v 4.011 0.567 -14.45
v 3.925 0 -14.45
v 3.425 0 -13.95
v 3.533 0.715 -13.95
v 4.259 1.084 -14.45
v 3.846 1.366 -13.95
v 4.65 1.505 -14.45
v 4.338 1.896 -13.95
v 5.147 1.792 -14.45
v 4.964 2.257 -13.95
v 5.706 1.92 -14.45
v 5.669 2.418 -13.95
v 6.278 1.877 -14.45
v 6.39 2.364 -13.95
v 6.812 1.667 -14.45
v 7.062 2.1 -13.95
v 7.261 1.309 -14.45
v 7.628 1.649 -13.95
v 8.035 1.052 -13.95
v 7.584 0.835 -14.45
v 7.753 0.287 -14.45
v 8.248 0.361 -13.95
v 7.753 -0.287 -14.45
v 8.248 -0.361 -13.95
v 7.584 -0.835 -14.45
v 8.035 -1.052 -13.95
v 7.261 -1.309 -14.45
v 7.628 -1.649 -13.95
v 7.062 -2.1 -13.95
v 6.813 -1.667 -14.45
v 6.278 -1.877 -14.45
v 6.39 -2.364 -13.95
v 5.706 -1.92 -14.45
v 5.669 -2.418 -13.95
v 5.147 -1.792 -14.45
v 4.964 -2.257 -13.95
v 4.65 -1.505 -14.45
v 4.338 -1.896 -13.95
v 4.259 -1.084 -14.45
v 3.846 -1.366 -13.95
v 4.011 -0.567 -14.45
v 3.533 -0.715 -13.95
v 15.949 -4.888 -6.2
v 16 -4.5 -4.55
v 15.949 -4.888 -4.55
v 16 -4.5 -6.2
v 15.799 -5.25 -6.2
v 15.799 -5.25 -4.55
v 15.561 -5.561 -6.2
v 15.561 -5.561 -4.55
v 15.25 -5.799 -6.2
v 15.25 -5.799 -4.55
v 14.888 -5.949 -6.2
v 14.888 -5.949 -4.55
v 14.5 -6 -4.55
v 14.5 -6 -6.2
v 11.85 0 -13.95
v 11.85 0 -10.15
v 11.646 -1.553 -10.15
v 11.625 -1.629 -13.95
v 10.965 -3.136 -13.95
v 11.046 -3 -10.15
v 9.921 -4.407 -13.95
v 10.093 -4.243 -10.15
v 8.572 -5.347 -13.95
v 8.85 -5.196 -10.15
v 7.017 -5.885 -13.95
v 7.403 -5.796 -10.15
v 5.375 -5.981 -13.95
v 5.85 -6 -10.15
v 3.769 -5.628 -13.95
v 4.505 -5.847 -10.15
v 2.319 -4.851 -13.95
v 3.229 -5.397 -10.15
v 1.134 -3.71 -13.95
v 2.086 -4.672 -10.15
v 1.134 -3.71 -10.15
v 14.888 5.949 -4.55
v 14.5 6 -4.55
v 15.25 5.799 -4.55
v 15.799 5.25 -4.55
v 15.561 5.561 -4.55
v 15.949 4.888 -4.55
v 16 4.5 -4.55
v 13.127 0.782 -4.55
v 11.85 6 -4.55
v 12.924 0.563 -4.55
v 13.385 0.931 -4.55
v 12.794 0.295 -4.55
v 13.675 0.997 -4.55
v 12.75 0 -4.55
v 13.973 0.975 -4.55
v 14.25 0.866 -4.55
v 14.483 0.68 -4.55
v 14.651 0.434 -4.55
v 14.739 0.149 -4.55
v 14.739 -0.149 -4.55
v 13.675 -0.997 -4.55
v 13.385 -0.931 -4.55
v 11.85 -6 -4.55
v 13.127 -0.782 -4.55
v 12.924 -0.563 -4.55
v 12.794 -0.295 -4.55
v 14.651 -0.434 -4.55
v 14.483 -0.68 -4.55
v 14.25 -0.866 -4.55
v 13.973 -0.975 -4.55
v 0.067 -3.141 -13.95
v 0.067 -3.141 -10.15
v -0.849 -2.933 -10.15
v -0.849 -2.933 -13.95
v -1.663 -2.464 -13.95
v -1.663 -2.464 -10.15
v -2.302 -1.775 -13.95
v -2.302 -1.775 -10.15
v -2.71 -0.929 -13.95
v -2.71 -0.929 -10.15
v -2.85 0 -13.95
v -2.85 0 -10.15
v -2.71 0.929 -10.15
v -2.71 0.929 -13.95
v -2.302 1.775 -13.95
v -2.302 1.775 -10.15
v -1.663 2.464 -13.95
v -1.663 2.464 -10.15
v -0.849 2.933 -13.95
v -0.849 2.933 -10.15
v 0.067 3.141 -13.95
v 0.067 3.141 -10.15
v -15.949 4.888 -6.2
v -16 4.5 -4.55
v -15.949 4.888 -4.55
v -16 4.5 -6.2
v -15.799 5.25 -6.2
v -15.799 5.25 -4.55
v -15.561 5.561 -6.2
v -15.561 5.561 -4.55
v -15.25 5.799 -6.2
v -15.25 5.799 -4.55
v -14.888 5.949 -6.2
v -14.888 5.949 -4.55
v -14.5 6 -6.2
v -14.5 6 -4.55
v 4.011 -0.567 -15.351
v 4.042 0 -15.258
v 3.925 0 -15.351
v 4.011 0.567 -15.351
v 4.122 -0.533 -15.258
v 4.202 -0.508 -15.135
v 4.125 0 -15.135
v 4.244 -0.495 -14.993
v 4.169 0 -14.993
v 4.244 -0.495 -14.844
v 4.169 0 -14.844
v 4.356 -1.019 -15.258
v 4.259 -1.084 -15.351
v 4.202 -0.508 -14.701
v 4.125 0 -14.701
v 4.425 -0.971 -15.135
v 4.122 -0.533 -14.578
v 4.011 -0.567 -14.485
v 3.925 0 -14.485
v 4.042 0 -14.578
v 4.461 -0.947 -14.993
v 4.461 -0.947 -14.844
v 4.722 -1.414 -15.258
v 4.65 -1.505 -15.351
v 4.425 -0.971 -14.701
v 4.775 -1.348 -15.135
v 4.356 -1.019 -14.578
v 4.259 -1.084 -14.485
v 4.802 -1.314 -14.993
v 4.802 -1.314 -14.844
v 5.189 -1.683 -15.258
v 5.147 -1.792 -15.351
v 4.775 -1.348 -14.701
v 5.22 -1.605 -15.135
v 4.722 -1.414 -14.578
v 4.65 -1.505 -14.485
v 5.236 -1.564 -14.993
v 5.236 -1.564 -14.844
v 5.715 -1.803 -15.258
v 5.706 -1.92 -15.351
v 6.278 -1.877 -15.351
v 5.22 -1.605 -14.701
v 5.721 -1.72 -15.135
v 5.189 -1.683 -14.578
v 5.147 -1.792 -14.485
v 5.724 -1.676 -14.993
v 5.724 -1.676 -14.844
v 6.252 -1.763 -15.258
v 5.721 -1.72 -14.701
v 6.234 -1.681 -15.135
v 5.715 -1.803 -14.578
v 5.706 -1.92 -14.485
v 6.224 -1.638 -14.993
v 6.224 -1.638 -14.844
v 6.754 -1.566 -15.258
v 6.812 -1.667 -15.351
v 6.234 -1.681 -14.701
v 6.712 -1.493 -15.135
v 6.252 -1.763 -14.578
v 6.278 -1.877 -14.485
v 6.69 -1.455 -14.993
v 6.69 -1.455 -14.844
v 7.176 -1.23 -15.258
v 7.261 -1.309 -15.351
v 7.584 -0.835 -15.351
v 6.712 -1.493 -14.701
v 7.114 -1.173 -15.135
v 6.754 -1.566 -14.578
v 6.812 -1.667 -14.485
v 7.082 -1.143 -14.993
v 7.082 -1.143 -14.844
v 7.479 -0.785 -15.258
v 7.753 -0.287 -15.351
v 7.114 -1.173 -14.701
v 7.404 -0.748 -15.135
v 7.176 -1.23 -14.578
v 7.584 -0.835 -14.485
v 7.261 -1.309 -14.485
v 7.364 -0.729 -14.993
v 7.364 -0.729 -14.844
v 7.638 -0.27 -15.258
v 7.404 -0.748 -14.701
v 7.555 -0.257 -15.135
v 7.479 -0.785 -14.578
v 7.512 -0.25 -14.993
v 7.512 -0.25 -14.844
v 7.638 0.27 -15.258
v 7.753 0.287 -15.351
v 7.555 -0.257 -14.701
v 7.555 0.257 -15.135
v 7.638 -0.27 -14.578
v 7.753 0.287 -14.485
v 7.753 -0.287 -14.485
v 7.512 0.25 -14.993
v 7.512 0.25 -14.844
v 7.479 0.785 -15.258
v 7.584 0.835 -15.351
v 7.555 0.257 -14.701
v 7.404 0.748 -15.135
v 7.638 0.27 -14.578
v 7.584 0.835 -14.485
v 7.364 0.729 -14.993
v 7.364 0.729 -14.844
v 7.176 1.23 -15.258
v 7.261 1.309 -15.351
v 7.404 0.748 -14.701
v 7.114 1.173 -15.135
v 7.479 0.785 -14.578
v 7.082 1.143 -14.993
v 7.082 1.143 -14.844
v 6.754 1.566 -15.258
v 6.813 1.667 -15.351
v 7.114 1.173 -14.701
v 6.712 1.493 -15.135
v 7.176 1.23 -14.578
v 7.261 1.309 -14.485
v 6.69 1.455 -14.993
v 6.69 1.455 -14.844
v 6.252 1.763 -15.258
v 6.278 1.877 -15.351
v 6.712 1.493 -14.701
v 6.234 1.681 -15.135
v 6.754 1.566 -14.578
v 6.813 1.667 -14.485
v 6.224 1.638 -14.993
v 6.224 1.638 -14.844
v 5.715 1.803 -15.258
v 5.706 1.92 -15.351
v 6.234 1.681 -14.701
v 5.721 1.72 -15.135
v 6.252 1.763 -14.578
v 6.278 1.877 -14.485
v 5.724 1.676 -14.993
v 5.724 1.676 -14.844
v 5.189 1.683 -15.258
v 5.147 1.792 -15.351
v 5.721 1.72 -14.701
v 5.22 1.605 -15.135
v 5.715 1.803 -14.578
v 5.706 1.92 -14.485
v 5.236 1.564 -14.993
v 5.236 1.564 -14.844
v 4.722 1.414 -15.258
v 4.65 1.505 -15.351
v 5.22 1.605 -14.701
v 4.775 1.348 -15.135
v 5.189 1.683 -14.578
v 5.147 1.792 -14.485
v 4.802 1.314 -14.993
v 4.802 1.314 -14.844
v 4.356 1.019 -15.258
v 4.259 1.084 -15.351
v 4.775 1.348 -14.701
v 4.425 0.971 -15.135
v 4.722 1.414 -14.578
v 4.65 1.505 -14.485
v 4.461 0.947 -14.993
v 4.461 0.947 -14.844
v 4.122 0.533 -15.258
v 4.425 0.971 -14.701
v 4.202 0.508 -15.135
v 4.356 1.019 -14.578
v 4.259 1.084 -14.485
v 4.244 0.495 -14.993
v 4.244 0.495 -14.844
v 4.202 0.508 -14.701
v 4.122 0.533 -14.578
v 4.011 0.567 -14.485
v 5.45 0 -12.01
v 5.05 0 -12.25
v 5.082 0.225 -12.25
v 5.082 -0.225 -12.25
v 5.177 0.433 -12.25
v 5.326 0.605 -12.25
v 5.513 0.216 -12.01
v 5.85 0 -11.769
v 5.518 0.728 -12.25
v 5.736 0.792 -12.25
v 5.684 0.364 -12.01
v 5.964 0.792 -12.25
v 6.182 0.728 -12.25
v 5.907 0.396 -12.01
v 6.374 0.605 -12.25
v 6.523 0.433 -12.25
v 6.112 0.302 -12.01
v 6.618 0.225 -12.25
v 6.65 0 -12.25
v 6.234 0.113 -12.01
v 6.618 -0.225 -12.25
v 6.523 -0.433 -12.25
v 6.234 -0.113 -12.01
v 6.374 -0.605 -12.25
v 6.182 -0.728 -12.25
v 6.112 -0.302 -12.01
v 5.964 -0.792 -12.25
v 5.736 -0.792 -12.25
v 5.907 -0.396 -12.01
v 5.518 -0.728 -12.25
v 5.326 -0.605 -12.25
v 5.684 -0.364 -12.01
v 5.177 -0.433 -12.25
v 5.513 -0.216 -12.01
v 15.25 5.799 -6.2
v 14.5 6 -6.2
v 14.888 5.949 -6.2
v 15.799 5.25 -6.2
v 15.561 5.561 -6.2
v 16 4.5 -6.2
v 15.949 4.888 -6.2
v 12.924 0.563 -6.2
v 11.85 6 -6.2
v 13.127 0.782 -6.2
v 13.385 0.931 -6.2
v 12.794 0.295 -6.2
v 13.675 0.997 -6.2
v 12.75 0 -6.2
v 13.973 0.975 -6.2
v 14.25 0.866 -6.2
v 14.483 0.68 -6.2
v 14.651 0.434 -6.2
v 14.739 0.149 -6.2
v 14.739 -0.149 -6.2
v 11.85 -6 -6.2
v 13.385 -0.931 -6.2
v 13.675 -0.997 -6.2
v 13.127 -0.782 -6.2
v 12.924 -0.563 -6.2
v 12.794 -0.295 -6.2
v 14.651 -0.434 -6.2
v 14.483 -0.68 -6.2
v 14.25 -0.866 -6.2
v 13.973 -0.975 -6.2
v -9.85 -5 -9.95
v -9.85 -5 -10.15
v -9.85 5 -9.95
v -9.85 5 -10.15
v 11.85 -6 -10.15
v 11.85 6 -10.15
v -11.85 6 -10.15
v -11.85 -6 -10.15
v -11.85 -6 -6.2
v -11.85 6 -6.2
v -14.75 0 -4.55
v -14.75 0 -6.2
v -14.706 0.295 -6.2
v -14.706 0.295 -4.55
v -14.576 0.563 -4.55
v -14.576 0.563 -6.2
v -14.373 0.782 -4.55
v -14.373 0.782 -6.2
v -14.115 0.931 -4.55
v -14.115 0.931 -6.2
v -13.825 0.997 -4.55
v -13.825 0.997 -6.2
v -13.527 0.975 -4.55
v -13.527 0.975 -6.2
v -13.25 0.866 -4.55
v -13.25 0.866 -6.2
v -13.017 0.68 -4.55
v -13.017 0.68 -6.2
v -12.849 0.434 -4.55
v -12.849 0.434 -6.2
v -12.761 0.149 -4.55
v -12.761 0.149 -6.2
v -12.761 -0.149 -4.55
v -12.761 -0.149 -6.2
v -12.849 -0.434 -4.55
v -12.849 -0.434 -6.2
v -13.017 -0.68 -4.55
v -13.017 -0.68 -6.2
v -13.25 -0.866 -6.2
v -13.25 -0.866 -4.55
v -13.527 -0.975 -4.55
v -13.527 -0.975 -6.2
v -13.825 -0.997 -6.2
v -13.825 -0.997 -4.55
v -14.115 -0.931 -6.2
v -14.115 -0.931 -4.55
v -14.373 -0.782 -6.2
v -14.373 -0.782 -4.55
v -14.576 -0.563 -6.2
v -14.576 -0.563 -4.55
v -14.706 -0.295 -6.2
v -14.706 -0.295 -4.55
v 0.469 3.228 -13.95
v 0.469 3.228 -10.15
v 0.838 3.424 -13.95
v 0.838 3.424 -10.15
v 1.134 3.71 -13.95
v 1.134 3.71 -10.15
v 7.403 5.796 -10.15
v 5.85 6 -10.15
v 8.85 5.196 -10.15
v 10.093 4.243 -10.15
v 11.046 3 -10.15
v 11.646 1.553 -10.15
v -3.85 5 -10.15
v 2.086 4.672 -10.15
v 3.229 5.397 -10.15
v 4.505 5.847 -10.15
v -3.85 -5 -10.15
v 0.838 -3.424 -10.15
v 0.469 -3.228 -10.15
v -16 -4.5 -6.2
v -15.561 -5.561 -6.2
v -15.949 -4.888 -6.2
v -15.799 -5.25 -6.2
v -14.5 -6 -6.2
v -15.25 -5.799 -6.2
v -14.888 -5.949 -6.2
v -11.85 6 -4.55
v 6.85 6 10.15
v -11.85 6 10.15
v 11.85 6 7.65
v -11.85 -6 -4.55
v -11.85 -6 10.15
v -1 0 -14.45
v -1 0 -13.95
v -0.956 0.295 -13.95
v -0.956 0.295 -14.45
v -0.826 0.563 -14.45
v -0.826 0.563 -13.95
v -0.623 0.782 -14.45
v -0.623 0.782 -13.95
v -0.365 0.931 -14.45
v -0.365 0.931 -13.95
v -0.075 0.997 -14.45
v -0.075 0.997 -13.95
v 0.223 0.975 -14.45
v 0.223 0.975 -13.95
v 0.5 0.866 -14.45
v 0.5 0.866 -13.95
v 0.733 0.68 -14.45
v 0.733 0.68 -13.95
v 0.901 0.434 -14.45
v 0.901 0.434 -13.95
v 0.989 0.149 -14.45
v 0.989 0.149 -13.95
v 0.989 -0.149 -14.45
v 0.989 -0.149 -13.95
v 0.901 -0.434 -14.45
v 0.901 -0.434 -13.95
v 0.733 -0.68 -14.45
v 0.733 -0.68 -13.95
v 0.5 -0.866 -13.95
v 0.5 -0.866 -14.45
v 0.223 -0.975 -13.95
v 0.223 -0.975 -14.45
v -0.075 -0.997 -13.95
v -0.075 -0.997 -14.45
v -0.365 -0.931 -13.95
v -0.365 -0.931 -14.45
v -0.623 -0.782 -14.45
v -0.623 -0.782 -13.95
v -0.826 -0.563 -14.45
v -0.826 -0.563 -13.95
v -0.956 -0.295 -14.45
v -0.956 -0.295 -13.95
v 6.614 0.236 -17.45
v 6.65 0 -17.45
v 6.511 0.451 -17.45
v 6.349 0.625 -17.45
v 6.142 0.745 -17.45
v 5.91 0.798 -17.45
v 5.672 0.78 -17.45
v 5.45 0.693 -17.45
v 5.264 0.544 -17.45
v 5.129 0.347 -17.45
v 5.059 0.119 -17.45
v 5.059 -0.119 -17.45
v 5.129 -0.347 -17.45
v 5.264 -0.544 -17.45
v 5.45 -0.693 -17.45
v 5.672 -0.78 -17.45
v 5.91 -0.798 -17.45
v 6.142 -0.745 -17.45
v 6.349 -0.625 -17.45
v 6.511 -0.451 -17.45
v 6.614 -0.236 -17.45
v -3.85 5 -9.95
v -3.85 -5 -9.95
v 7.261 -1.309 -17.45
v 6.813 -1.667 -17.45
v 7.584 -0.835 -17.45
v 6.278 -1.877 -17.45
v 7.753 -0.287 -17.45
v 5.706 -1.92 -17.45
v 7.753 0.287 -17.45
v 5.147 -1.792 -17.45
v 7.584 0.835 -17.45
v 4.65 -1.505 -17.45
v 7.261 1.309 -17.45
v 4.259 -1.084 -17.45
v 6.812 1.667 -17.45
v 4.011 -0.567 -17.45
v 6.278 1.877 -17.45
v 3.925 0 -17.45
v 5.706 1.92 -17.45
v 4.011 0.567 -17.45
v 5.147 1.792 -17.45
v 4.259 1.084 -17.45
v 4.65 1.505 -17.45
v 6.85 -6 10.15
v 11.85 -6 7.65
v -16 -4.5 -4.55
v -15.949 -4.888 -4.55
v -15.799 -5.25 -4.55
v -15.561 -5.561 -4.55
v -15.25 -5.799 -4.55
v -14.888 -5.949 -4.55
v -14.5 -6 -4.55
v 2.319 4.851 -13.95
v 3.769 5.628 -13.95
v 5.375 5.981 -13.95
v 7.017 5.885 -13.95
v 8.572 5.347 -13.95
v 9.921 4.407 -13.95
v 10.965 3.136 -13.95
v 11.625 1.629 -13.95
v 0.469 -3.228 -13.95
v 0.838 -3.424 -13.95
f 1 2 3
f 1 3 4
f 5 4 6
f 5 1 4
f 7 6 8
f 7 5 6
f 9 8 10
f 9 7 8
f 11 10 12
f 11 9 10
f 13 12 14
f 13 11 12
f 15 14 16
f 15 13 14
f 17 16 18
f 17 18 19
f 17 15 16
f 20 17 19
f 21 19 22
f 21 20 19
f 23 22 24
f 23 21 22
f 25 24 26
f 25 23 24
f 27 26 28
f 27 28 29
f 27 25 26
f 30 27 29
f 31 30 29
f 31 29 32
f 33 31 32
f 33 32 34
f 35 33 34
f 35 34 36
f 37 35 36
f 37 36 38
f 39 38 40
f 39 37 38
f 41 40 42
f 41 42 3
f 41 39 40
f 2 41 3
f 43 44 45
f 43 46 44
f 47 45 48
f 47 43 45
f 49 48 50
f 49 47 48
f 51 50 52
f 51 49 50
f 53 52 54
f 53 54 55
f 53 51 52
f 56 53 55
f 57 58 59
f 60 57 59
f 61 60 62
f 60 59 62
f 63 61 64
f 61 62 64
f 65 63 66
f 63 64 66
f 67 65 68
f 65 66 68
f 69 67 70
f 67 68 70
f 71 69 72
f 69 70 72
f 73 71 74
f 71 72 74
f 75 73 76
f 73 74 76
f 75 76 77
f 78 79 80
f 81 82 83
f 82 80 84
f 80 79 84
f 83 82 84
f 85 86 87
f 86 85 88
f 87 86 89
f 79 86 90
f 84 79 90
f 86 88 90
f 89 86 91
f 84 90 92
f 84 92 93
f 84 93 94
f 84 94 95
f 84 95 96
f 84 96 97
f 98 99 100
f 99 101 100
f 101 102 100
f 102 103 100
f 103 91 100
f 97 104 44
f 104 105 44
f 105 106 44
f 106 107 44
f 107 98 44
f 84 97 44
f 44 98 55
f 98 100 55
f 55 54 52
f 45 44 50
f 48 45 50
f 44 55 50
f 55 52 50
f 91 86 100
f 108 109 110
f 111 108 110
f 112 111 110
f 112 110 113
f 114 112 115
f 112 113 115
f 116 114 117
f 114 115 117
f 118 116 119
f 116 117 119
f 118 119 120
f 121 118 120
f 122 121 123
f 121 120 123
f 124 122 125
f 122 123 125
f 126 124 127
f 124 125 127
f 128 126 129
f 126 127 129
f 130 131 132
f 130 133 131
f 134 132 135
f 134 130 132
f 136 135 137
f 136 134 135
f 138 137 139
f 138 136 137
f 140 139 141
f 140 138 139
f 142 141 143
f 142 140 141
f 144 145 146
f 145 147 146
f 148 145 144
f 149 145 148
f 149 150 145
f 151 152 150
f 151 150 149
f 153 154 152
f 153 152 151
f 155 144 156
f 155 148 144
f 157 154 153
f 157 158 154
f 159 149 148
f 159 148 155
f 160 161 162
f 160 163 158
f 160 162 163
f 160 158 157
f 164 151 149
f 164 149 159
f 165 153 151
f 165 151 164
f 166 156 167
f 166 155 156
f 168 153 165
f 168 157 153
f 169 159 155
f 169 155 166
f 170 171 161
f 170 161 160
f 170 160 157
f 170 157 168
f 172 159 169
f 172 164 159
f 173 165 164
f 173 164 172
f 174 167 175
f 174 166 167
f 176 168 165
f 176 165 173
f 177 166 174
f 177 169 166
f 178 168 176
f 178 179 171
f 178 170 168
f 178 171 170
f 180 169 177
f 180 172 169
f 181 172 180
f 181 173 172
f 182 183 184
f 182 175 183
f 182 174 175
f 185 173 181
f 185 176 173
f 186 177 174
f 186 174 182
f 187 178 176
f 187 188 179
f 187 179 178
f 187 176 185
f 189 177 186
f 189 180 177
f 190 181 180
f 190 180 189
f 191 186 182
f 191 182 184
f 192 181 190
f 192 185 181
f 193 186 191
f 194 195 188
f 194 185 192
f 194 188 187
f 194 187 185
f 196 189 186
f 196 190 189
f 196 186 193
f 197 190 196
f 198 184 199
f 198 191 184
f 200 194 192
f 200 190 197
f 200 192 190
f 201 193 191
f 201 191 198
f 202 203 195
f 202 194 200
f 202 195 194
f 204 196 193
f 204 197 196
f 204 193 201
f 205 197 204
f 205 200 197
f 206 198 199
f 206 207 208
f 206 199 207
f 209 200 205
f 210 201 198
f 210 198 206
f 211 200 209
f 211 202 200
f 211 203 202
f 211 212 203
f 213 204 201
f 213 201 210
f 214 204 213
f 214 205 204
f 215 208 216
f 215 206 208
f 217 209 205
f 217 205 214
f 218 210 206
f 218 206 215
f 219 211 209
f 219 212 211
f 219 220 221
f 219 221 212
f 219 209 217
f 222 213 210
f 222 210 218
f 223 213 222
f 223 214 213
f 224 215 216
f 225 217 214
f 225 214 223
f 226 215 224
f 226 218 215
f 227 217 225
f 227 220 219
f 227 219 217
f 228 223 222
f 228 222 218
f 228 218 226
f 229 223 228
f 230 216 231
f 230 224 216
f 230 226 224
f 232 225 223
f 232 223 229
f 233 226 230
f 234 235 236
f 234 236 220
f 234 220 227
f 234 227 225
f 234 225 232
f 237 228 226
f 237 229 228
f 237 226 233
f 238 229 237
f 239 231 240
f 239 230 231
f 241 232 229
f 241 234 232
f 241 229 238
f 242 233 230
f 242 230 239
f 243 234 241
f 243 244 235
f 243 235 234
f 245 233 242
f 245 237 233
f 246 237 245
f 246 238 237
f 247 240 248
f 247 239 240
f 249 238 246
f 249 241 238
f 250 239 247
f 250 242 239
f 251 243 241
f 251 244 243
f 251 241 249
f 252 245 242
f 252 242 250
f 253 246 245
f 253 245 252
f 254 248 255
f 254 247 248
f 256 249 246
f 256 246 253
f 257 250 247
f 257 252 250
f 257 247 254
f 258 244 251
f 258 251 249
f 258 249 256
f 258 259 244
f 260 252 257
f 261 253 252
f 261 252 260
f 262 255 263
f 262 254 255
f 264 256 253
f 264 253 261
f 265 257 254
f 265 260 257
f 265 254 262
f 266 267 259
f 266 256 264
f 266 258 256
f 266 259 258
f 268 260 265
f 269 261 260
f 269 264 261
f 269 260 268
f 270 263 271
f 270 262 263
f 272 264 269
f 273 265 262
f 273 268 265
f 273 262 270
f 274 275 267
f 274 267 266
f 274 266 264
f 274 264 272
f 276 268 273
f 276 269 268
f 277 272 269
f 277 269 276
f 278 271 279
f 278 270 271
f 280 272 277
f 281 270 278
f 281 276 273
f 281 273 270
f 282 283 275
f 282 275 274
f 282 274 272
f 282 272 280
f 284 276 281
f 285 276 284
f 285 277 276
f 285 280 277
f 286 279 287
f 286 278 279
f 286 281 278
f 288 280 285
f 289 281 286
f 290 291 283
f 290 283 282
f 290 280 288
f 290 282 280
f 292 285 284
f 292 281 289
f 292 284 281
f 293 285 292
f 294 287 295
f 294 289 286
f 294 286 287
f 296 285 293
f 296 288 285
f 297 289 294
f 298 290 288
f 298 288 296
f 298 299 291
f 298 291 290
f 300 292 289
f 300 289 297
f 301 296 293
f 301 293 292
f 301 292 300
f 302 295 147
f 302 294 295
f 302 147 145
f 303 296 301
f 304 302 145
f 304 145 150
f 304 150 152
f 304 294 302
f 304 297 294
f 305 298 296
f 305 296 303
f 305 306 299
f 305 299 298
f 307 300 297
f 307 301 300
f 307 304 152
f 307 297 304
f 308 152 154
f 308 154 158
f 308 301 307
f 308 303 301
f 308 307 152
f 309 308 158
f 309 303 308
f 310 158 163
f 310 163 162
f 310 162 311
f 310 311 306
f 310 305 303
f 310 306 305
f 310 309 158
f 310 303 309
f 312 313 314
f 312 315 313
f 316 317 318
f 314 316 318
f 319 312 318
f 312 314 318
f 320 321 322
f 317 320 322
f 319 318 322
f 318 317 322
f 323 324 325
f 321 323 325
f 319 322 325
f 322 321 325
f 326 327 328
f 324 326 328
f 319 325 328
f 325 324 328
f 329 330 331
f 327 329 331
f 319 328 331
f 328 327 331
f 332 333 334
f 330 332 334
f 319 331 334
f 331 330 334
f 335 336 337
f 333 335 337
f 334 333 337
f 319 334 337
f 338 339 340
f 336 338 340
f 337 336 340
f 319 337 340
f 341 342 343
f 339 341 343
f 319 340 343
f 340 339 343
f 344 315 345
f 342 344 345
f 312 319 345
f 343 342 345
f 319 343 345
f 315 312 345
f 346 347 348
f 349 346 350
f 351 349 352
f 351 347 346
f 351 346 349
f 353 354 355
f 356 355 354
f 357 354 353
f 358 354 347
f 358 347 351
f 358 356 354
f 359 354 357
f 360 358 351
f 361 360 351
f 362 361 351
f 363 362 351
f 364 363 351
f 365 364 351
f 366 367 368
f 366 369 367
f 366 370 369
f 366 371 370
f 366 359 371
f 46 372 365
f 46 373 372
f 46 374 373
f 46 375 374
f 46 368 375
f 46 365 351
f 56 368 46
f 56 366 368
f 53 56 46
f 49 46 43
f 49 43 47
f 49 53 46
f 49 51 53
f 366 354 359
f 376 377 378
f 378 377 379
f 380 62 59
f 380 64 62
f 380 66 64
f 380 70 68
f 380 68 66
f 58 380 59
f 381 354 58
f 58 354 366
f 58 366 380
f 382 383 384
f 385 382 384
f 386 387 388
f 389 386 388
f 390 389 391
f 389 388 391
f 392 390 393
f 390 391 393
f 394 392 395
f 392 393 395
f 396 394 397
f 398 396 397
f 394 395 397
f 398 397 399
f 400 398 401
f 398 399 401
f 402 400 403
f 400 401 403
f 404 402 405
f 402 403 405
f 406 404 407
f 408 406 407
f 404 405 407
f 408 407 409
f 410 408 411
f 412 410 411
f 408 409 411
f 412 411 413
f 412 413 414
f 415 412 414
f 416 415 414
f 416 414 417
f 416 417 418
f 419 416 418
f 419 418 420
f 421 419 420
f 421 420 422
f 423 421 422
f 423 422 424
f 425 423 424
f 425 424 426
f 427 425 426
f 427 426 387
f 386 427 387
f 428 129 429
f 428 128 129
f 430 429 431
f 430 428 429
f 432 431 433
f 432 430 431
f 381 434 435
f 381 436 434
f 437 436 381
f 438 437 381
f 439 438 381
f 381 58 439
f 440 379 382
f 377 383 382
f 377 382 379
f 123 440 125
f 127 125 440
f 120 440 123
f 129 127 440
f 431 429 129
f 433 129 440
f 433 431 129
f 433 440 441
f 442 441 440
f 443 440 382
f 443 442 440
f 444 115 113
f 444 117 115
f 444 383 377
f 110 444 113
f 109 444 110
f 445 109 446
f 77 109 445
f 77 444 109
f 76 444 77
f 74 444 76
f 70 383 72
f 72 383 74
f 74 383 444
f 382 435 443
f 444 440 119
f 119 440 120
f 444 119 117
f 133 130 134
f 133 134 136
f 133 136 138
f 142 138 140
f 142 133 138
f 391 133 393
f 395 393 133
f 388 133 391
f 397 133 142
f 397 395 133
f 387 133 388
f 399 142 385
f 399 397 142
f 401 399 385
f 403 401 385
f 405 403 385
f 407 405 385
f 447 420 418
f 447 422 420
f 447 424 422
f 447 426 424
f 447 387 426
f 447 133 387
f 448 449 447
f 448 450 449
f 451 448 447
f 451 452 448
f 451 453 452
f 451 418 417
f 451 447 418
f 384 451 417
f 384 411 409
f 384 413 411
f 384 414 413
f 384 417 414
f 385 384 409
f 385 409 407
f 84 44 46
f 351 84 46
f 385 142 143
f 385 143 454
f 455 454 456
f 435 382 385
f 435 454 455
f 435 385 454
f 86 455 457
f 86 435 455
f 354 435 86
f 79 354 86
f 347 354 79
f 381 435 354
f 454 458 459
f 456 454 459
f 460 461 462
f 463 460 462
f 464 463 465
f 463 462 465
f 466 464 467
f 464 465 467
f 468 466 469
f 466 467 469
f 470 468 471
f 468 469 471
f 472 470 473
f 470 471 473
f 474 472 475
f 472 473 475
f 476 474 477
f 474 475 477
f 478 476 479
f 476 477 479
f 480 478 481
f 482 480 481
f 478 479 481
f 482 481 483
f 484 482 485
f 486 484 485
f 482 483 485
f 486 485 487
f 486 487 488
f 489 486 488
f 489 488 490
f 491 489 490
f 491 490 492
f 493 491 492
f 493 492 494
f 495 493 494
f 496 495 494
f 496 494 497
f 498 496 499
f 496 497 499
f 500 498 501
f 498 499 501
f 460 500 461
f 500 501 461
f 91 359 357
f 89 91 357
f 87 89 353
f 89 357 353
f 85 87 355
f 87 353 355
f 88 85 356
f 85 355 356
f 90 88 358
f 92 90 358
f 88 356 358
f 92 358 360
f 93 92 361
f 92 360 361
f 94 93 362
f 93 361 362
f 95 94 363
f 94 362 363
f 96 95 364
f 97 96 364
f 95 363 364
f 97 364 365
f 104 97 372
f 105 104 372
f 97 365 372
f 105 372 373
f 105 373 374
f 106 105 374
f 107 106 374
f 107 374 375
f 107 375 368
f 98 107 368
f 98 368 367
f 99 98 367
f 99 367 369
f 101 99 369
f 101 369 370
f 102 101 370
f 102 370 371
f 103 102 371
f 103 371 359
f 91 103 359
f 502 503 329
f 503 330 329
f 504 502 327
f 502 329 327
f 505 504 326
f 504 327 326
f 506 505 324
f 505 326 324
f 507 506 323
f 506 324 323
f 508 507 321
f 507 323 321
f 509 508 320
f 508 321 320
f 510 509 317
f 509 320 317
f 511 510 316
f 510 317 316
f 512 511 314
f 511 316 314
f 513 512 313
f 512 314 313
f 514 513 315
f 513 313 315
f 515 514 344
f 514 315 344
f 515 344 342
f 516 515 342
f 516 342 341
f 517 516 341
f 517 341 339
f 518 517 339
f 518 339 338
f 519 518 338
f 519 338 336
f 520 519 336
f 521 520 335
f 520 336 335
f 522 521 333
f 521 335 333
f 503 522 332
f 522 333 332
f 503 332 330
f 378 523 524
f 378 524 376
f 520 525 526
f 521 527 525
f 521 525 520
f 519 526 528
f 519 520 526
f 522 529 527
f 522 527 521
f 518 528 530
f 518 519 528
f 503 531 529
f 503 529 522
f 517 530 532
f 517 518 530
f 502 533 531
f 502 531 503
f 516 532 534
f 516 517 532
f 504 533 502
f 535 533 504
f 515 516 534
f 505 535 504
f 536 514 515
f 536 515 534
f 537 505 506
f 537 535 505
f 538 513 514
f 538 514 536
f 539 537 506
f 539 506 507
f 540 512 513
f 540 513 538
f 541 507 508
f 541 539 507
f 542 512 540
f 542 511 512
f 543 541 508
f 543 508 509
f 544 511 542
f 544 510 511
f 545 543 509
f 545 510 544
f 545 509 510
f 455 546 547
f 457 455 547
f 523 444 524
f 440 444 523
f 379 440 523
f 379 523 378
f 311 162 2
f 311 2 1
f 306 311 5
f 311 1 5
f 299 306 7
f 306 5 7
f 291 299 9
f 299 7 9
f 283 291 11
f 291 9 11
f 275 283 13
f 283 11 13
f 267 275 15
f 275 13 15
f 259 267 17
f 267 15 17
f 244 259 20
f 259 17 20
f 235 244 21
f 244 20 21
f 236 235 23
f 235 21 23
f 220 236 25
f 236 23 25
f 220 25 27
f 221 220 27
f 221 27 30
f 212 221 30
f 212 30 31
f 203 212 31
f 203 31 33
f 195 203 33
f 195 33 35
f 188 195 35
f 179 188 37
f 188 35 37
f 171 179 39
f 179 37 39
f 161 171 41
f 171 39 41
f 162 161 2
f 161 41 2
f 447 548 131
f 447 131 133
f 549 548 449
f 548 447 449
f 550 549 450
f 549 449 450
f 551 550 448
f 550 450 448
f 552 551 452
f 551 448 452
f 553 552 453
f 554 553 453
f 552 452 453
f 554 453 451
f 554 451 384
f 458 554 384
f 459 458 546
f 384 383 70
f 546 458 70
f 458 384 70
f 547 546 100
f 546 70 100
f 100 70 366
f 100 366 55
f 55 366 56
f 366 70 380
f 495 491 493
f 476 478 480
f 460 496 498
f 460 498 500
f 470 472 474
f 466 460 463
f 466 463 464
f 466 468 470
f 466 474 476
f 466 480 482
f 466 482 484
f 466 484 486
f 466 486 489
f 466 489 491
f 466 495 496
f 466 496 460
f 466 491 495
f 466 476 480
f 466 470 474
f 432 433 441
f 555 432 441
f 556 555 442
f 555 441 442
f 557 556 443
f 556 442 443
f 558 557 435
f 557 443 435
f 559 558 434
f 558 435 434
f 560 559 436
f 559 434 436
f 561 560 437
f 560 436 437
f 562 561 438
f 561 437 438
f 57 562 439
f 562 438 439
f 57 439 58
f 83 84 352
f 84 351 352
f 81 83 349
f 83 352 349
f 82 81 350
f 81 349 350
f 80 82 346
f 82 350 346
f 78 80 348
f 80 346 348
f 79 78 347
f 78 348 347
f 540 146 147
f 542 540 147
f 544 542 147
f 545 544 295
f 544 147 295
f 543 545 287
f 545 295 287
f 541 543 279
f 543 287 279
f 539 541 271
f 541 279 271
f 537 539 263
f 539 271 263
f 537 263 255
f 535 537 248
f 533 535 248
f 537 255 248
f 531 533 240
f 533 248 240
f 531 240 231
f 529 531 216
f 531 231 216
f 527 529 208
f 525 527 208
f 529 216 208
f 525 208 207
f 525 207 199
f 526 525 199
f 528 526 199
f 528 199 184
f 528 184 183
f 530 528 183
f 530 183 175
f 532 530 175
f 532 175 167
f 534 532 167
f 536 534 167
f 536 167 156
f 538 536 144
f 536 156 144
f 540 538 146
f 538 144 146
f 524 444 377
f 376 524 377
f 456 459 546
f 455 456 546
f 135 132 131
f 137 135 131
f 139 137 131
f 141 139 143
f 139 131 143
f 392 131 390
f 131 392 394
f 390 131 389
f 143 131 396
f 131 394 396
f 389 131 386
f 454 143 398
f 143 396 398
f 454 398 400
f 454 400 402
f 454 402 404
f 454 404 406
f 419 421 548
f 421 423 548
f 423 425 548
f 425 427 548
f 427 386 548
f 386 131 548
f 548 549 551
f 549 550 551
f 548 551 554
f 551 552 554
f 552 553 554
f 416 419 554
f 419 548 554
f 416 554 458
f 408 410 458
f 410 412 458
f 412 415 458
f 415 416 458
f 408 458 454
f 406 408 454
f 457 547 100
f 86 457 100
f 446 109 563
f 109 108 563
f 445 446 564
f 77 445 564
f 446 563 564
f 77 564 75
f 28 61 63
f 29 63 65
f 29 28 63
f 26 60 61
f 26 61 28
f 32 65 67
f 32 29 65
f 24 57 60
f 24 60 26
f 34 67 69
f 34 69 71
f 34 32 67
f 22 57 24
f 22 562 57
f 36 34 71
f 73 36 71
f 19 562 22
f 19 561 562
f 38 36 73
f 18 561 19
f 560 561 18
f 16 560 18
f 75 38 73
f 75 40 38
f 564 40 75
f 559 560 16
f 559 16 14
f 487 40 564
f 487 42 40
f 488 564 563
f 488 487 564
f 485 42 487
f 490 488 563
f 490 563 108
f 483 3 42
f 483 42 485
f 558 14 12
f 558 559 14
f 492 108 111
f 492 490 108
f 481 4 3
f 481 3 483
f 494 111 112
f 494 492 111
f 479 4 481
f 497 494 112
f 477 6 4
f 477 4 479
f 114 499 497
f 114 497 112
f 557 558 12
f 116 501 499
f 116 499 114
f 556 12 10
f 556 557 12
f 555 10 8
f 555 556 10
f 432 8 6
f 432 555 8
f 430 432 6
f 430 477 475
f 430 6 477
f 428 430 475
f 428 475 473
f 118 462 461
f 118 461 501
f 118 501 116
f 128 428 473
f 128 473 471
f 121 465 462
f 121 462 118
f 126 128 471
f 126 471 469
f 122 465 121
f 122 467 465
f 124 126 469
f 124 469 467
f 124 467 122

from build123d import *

# Parameters (mm, degrees)
BOSS_EXTRUDE1_DEPTH       = 6
BOSS_EXTRUDE1_DEPTH_BACK  = 6
SKETCH1_W                 = 23.7
SKETCH1_H                 = 3.95
SKETCH1_H_2               = 1.65
SKETCH1_W_2               = 4.15
FILLET1_R                 = 1.5
SKETCH2_R                 = 1
CUT_EXTRUDE1_DEPTH        = 24.65
BOSS_EXTRUDE2_DEPTH       = 3.8
FILLET2_R                 = 1.5
SKETCH4_W                 = 6
SKETCH4_H                 = 10
CUT_EXTRUDE2_DEPTH        = 0.2
SKETCH5_R                 = 1
BOSS_EXTRUDE3_DEPTH       = 0.5
SKETCH6_R                 = 1.925
BOSS_EXTRUDE4_DEPTH       = 0.5
CHAMFER1_SIZE             = 0.5
SKETCH7_R                 = 1.925
BOSS_EXTRUDE5_DEPTH       = 3
SKETCH8_R                 = 0.5
M2X0_4_TAPPED_HOLE1_D     = 1.6
M2X0_4_TAPPED_HOLE1_DEPTH = 5.2
M2X0_4_TAPPED_HOLE1_TIP   = 0.480688495


with BuildPart() as part:
    # Sketch1 → Boss-Extrude1 (new, two sides: drawn at the far end of the back side and taken through both)
    with BuildSketch(Plane(origin=(0, 0, 0), x_dir=(1, 0, 0), z_dir=(0, 1, 0)).offset(-BOSS_EXTRUDE1_DEPTH_BACK)):
        with Locations((0, 8.175)):
            Rectangle(SKETCH1_W, SKETCH1_H)
        with Locations((0, 5.375)):
            Rectangle(SKETCH1_W, SKETCH1_H_2)
        with Locations((-13.925, 5.375)):
            Rectangle(SKETCH1_W_2, SKETCH1_H_2)
        with Locations((13.925, 5.375)):
            Rectangle(SKETCH1_W_2, SKETCH1_H_2)
        Polygon((-11.85, -10.15), (6.85, -10.15), (11.85, -7.65), (11.85, 4.55), (-11.85, 4.55), align=None)
    extrude(amount=BOSS_EXTRUDE1_DEPTH + BOSS_EXTRUDE1_DEPTH_BACK)

    # Fillet1
    fillet1_edges = [part.edges().sort_by_distance(p)[0] for p in [
        (-16, -6, -5.375),
        (16, 6, -5.375),
        (-16, 6, -5.375),
        (16, -6, -5.375),
    ]]
    fillet(fillet1_edges, radius=FILLET1_R)

    # Sketch2 → Cut-Extrude1 (cut, through all)
    with BuildSketch(Plane(origin=(0, 0, -6.2), x_dir=(-1, 0, 0), z_dir=(0, 0, -1))):
        with Locations((-13.75, 0)):
            Circle(SKETCH2_R)
        with Locations((13.75, 0)):
            Circle(SKETCH2_R)
    extrude(amount=-CUT_EXTRUDE1_DEPTH, mode=Mode.SUBTRACT)

    # Sketch3 → Boss-Extrude2 (add)
    with BuildSketch(Plane(origin=(0, 0, -10.15), x_dir=(-1, 0, 0), z_dir=(0, 0, -1))):
        with BuildLine():
            ThreePointArc((-0.725675676, 3.121105608), (-0.073065435, 1.620810608), (0.15, 0))
            Line((0.15, 0), (2.85, 0))
            ThreePointArc((2.85, 0), (1.77142724, 2.373118031), (-0.725675676, 3.121105608))
        make_face()
        with BuildLine():
            ThreePointArc((-0.725675676, -3.121105608), (-0.073065435, -1.620810608), (0.15, 0))
            Line((0.15, 0), (-3.45, 0))
            ThreePointArc((-3.45, 0), (-2.673118031, -2.07142724), (-0.725675676, -3.121105608))
        make_face()
        with BuildLine():
            Line((-3.45, 0), (0.15, 0))
            ThreePointArc((0.15, 0), (-0.073065435, 1.620810608), (-0.725675676, 3.121105608))
            ThreePointArc((-0.725675676, 3.121105608), (-2.673118031, 2.07142724), (-3.45, 0))
        make_face()
        with BuildLine():
            Line((2.85, 0), (0.15, 0))
            ThreePointArc((0.15, 0), (-0.073065435, -1.620810608), (-0.725675676, -3.121105608))
            ThreePointArc((-0.725675676, -3.121105608), (1.77142724, -2.373118031), (2.85, 0))
        make_face()
        with BuildLine():
            ThreePointArc((-0.725675676, -3.121105608), (-2.673118031, -2.07142724), (-3.45, 0))
            Line((-3.45, 0), (-11.85, 0))
            ThreePointArc((-11.85, 0), (-7.470810608, -5.776934565), (-0.725675676, -3.121105608))
        make_face()
        with BuildLine():
            Line((-11.85, 0), (-3.45, 0))
            ThreePointArc((-3.45, 0), (-2.673118031, 2.07142724), (-0.725675676, 3.121105608))
            ThreePointArc((-0.725675676, 3.121105608), (-7.470810608, 5.776934565), (-11.85, 0))
        make_face()
    extrude(amount=BOSS_EXTRUDE2_DEPTH)

    # Fillet2
    fillet2_edges = [part.edges().sort_by_distance(p)[0] for p in [
        (0.725675676, 3.121105608, -12.05),
        (0.725675676, -3.121105608, -12.05),
    ]]
    fillet(fillet2_edges, radius=FILLET2_R)

    # Sketch4 → Cut-Extrude2 (cut)
    with BuildSketch(Plane(origin=(0, 0, -10.15), x_dir=(-1, 0, 0), z_dir=(0, 0, -1))):
        with Locations((6.85, 0)):
            Rectangle(SKETCH4_W, SKETCH4_H)
    extrude(amount=-CUT_EXTRUDE2_DEPTH, mode=Mode.SUBTRACT)

    # Sketch5 → Boss-Extrude3 (add)
    with BuildSketch(Plane(origin=(0, 0, -13.95), x_dir=(-1, 0, 0), z_dir=(0, 0, -1))):
        Circle(SKETCH5_R)
    extrude(amount=BOSS_EXTRUDE3_DEPTH)

    # Sketch6 → Boss-Extrude4 (add)
    with BuildSketch(Plane(origin=(0, 0, -13.95), x_dir=(-1, 0, 0), z_dir=(0, 0, -1))):
        with Locations((-5.85, 0)):
            Circle(SKETCH6_R)
    extrude(amount=BOSS_EXTRUDE4_DEPTH)

    # Chamfer1
    chamfer1_edges = [part.edges().sort_by_distance(p)[0] for p in [
        (7.775, 0, -13.95),
    ]]
    chamfer(chamfer1_edges, length=CHAMFER1_SIZE - 0.0001)  # a hair under: the kernel refuses the full size

    # Sketch7 → Boss-Extrude5 (add)
    with BuildSketch(Plane(origin=(0, 0, -14.45), x_dir=(-1, 0, 0), z_dir=(0, 0, -1))):
        with Locations((-5.85, 0)):
            Circle(SKETCH7_R)
    extrude(amount=BOSS_EXTRUDE5_DEPTH)

    # Sketch8 → Cut-Revolve1 (revolve, cut)
    with BuildSketch(Plane(origin=(0, 0, 0), x_dir=(1, 0, 0), z_dir=(0, 1, 0)), mode=Mode.PRIVATE) as cut_revolve1_sk:
        with Locations((8.025, 14.91837485)):
            Circle(SKETCH8_R)
    revolve(cut_revolve1_sk.sketch.rotate(Axis((5.85, 0, -17.45), (0, 0, 1)), 180), axis=Axis((5.85, 0, -17.45), (0, 0, 1)), mode=Mode.SUBTRACT)

    # M2x0.4 Tapped Hole1
    with Locations(Plane(origin=(0, 0, -17.45), x_dir=(-1, 0, 0), z_dir=(0, 0, -1))):
        with Locations((-5.85, 0)):
            Hole(M2X0_4_TAPPED_HOLE1_D / 2, depth=M2X0_4_TAPPED_HOLE1_DEPTH)
            with Locations((0, 0, -(M2X0_4_TAPPED_HOLE1_DEPTH + M2X0_4_TAPPED_HOLE1_TIP / 2))):  # 118° drill point
                Cone(0, M2X0_4_TAPPED_HOLE1_D / 2, M2X0_4_TAPPED_HOLE1_TIP, mode=Mode.SUBTRACT)


solid = part.part
